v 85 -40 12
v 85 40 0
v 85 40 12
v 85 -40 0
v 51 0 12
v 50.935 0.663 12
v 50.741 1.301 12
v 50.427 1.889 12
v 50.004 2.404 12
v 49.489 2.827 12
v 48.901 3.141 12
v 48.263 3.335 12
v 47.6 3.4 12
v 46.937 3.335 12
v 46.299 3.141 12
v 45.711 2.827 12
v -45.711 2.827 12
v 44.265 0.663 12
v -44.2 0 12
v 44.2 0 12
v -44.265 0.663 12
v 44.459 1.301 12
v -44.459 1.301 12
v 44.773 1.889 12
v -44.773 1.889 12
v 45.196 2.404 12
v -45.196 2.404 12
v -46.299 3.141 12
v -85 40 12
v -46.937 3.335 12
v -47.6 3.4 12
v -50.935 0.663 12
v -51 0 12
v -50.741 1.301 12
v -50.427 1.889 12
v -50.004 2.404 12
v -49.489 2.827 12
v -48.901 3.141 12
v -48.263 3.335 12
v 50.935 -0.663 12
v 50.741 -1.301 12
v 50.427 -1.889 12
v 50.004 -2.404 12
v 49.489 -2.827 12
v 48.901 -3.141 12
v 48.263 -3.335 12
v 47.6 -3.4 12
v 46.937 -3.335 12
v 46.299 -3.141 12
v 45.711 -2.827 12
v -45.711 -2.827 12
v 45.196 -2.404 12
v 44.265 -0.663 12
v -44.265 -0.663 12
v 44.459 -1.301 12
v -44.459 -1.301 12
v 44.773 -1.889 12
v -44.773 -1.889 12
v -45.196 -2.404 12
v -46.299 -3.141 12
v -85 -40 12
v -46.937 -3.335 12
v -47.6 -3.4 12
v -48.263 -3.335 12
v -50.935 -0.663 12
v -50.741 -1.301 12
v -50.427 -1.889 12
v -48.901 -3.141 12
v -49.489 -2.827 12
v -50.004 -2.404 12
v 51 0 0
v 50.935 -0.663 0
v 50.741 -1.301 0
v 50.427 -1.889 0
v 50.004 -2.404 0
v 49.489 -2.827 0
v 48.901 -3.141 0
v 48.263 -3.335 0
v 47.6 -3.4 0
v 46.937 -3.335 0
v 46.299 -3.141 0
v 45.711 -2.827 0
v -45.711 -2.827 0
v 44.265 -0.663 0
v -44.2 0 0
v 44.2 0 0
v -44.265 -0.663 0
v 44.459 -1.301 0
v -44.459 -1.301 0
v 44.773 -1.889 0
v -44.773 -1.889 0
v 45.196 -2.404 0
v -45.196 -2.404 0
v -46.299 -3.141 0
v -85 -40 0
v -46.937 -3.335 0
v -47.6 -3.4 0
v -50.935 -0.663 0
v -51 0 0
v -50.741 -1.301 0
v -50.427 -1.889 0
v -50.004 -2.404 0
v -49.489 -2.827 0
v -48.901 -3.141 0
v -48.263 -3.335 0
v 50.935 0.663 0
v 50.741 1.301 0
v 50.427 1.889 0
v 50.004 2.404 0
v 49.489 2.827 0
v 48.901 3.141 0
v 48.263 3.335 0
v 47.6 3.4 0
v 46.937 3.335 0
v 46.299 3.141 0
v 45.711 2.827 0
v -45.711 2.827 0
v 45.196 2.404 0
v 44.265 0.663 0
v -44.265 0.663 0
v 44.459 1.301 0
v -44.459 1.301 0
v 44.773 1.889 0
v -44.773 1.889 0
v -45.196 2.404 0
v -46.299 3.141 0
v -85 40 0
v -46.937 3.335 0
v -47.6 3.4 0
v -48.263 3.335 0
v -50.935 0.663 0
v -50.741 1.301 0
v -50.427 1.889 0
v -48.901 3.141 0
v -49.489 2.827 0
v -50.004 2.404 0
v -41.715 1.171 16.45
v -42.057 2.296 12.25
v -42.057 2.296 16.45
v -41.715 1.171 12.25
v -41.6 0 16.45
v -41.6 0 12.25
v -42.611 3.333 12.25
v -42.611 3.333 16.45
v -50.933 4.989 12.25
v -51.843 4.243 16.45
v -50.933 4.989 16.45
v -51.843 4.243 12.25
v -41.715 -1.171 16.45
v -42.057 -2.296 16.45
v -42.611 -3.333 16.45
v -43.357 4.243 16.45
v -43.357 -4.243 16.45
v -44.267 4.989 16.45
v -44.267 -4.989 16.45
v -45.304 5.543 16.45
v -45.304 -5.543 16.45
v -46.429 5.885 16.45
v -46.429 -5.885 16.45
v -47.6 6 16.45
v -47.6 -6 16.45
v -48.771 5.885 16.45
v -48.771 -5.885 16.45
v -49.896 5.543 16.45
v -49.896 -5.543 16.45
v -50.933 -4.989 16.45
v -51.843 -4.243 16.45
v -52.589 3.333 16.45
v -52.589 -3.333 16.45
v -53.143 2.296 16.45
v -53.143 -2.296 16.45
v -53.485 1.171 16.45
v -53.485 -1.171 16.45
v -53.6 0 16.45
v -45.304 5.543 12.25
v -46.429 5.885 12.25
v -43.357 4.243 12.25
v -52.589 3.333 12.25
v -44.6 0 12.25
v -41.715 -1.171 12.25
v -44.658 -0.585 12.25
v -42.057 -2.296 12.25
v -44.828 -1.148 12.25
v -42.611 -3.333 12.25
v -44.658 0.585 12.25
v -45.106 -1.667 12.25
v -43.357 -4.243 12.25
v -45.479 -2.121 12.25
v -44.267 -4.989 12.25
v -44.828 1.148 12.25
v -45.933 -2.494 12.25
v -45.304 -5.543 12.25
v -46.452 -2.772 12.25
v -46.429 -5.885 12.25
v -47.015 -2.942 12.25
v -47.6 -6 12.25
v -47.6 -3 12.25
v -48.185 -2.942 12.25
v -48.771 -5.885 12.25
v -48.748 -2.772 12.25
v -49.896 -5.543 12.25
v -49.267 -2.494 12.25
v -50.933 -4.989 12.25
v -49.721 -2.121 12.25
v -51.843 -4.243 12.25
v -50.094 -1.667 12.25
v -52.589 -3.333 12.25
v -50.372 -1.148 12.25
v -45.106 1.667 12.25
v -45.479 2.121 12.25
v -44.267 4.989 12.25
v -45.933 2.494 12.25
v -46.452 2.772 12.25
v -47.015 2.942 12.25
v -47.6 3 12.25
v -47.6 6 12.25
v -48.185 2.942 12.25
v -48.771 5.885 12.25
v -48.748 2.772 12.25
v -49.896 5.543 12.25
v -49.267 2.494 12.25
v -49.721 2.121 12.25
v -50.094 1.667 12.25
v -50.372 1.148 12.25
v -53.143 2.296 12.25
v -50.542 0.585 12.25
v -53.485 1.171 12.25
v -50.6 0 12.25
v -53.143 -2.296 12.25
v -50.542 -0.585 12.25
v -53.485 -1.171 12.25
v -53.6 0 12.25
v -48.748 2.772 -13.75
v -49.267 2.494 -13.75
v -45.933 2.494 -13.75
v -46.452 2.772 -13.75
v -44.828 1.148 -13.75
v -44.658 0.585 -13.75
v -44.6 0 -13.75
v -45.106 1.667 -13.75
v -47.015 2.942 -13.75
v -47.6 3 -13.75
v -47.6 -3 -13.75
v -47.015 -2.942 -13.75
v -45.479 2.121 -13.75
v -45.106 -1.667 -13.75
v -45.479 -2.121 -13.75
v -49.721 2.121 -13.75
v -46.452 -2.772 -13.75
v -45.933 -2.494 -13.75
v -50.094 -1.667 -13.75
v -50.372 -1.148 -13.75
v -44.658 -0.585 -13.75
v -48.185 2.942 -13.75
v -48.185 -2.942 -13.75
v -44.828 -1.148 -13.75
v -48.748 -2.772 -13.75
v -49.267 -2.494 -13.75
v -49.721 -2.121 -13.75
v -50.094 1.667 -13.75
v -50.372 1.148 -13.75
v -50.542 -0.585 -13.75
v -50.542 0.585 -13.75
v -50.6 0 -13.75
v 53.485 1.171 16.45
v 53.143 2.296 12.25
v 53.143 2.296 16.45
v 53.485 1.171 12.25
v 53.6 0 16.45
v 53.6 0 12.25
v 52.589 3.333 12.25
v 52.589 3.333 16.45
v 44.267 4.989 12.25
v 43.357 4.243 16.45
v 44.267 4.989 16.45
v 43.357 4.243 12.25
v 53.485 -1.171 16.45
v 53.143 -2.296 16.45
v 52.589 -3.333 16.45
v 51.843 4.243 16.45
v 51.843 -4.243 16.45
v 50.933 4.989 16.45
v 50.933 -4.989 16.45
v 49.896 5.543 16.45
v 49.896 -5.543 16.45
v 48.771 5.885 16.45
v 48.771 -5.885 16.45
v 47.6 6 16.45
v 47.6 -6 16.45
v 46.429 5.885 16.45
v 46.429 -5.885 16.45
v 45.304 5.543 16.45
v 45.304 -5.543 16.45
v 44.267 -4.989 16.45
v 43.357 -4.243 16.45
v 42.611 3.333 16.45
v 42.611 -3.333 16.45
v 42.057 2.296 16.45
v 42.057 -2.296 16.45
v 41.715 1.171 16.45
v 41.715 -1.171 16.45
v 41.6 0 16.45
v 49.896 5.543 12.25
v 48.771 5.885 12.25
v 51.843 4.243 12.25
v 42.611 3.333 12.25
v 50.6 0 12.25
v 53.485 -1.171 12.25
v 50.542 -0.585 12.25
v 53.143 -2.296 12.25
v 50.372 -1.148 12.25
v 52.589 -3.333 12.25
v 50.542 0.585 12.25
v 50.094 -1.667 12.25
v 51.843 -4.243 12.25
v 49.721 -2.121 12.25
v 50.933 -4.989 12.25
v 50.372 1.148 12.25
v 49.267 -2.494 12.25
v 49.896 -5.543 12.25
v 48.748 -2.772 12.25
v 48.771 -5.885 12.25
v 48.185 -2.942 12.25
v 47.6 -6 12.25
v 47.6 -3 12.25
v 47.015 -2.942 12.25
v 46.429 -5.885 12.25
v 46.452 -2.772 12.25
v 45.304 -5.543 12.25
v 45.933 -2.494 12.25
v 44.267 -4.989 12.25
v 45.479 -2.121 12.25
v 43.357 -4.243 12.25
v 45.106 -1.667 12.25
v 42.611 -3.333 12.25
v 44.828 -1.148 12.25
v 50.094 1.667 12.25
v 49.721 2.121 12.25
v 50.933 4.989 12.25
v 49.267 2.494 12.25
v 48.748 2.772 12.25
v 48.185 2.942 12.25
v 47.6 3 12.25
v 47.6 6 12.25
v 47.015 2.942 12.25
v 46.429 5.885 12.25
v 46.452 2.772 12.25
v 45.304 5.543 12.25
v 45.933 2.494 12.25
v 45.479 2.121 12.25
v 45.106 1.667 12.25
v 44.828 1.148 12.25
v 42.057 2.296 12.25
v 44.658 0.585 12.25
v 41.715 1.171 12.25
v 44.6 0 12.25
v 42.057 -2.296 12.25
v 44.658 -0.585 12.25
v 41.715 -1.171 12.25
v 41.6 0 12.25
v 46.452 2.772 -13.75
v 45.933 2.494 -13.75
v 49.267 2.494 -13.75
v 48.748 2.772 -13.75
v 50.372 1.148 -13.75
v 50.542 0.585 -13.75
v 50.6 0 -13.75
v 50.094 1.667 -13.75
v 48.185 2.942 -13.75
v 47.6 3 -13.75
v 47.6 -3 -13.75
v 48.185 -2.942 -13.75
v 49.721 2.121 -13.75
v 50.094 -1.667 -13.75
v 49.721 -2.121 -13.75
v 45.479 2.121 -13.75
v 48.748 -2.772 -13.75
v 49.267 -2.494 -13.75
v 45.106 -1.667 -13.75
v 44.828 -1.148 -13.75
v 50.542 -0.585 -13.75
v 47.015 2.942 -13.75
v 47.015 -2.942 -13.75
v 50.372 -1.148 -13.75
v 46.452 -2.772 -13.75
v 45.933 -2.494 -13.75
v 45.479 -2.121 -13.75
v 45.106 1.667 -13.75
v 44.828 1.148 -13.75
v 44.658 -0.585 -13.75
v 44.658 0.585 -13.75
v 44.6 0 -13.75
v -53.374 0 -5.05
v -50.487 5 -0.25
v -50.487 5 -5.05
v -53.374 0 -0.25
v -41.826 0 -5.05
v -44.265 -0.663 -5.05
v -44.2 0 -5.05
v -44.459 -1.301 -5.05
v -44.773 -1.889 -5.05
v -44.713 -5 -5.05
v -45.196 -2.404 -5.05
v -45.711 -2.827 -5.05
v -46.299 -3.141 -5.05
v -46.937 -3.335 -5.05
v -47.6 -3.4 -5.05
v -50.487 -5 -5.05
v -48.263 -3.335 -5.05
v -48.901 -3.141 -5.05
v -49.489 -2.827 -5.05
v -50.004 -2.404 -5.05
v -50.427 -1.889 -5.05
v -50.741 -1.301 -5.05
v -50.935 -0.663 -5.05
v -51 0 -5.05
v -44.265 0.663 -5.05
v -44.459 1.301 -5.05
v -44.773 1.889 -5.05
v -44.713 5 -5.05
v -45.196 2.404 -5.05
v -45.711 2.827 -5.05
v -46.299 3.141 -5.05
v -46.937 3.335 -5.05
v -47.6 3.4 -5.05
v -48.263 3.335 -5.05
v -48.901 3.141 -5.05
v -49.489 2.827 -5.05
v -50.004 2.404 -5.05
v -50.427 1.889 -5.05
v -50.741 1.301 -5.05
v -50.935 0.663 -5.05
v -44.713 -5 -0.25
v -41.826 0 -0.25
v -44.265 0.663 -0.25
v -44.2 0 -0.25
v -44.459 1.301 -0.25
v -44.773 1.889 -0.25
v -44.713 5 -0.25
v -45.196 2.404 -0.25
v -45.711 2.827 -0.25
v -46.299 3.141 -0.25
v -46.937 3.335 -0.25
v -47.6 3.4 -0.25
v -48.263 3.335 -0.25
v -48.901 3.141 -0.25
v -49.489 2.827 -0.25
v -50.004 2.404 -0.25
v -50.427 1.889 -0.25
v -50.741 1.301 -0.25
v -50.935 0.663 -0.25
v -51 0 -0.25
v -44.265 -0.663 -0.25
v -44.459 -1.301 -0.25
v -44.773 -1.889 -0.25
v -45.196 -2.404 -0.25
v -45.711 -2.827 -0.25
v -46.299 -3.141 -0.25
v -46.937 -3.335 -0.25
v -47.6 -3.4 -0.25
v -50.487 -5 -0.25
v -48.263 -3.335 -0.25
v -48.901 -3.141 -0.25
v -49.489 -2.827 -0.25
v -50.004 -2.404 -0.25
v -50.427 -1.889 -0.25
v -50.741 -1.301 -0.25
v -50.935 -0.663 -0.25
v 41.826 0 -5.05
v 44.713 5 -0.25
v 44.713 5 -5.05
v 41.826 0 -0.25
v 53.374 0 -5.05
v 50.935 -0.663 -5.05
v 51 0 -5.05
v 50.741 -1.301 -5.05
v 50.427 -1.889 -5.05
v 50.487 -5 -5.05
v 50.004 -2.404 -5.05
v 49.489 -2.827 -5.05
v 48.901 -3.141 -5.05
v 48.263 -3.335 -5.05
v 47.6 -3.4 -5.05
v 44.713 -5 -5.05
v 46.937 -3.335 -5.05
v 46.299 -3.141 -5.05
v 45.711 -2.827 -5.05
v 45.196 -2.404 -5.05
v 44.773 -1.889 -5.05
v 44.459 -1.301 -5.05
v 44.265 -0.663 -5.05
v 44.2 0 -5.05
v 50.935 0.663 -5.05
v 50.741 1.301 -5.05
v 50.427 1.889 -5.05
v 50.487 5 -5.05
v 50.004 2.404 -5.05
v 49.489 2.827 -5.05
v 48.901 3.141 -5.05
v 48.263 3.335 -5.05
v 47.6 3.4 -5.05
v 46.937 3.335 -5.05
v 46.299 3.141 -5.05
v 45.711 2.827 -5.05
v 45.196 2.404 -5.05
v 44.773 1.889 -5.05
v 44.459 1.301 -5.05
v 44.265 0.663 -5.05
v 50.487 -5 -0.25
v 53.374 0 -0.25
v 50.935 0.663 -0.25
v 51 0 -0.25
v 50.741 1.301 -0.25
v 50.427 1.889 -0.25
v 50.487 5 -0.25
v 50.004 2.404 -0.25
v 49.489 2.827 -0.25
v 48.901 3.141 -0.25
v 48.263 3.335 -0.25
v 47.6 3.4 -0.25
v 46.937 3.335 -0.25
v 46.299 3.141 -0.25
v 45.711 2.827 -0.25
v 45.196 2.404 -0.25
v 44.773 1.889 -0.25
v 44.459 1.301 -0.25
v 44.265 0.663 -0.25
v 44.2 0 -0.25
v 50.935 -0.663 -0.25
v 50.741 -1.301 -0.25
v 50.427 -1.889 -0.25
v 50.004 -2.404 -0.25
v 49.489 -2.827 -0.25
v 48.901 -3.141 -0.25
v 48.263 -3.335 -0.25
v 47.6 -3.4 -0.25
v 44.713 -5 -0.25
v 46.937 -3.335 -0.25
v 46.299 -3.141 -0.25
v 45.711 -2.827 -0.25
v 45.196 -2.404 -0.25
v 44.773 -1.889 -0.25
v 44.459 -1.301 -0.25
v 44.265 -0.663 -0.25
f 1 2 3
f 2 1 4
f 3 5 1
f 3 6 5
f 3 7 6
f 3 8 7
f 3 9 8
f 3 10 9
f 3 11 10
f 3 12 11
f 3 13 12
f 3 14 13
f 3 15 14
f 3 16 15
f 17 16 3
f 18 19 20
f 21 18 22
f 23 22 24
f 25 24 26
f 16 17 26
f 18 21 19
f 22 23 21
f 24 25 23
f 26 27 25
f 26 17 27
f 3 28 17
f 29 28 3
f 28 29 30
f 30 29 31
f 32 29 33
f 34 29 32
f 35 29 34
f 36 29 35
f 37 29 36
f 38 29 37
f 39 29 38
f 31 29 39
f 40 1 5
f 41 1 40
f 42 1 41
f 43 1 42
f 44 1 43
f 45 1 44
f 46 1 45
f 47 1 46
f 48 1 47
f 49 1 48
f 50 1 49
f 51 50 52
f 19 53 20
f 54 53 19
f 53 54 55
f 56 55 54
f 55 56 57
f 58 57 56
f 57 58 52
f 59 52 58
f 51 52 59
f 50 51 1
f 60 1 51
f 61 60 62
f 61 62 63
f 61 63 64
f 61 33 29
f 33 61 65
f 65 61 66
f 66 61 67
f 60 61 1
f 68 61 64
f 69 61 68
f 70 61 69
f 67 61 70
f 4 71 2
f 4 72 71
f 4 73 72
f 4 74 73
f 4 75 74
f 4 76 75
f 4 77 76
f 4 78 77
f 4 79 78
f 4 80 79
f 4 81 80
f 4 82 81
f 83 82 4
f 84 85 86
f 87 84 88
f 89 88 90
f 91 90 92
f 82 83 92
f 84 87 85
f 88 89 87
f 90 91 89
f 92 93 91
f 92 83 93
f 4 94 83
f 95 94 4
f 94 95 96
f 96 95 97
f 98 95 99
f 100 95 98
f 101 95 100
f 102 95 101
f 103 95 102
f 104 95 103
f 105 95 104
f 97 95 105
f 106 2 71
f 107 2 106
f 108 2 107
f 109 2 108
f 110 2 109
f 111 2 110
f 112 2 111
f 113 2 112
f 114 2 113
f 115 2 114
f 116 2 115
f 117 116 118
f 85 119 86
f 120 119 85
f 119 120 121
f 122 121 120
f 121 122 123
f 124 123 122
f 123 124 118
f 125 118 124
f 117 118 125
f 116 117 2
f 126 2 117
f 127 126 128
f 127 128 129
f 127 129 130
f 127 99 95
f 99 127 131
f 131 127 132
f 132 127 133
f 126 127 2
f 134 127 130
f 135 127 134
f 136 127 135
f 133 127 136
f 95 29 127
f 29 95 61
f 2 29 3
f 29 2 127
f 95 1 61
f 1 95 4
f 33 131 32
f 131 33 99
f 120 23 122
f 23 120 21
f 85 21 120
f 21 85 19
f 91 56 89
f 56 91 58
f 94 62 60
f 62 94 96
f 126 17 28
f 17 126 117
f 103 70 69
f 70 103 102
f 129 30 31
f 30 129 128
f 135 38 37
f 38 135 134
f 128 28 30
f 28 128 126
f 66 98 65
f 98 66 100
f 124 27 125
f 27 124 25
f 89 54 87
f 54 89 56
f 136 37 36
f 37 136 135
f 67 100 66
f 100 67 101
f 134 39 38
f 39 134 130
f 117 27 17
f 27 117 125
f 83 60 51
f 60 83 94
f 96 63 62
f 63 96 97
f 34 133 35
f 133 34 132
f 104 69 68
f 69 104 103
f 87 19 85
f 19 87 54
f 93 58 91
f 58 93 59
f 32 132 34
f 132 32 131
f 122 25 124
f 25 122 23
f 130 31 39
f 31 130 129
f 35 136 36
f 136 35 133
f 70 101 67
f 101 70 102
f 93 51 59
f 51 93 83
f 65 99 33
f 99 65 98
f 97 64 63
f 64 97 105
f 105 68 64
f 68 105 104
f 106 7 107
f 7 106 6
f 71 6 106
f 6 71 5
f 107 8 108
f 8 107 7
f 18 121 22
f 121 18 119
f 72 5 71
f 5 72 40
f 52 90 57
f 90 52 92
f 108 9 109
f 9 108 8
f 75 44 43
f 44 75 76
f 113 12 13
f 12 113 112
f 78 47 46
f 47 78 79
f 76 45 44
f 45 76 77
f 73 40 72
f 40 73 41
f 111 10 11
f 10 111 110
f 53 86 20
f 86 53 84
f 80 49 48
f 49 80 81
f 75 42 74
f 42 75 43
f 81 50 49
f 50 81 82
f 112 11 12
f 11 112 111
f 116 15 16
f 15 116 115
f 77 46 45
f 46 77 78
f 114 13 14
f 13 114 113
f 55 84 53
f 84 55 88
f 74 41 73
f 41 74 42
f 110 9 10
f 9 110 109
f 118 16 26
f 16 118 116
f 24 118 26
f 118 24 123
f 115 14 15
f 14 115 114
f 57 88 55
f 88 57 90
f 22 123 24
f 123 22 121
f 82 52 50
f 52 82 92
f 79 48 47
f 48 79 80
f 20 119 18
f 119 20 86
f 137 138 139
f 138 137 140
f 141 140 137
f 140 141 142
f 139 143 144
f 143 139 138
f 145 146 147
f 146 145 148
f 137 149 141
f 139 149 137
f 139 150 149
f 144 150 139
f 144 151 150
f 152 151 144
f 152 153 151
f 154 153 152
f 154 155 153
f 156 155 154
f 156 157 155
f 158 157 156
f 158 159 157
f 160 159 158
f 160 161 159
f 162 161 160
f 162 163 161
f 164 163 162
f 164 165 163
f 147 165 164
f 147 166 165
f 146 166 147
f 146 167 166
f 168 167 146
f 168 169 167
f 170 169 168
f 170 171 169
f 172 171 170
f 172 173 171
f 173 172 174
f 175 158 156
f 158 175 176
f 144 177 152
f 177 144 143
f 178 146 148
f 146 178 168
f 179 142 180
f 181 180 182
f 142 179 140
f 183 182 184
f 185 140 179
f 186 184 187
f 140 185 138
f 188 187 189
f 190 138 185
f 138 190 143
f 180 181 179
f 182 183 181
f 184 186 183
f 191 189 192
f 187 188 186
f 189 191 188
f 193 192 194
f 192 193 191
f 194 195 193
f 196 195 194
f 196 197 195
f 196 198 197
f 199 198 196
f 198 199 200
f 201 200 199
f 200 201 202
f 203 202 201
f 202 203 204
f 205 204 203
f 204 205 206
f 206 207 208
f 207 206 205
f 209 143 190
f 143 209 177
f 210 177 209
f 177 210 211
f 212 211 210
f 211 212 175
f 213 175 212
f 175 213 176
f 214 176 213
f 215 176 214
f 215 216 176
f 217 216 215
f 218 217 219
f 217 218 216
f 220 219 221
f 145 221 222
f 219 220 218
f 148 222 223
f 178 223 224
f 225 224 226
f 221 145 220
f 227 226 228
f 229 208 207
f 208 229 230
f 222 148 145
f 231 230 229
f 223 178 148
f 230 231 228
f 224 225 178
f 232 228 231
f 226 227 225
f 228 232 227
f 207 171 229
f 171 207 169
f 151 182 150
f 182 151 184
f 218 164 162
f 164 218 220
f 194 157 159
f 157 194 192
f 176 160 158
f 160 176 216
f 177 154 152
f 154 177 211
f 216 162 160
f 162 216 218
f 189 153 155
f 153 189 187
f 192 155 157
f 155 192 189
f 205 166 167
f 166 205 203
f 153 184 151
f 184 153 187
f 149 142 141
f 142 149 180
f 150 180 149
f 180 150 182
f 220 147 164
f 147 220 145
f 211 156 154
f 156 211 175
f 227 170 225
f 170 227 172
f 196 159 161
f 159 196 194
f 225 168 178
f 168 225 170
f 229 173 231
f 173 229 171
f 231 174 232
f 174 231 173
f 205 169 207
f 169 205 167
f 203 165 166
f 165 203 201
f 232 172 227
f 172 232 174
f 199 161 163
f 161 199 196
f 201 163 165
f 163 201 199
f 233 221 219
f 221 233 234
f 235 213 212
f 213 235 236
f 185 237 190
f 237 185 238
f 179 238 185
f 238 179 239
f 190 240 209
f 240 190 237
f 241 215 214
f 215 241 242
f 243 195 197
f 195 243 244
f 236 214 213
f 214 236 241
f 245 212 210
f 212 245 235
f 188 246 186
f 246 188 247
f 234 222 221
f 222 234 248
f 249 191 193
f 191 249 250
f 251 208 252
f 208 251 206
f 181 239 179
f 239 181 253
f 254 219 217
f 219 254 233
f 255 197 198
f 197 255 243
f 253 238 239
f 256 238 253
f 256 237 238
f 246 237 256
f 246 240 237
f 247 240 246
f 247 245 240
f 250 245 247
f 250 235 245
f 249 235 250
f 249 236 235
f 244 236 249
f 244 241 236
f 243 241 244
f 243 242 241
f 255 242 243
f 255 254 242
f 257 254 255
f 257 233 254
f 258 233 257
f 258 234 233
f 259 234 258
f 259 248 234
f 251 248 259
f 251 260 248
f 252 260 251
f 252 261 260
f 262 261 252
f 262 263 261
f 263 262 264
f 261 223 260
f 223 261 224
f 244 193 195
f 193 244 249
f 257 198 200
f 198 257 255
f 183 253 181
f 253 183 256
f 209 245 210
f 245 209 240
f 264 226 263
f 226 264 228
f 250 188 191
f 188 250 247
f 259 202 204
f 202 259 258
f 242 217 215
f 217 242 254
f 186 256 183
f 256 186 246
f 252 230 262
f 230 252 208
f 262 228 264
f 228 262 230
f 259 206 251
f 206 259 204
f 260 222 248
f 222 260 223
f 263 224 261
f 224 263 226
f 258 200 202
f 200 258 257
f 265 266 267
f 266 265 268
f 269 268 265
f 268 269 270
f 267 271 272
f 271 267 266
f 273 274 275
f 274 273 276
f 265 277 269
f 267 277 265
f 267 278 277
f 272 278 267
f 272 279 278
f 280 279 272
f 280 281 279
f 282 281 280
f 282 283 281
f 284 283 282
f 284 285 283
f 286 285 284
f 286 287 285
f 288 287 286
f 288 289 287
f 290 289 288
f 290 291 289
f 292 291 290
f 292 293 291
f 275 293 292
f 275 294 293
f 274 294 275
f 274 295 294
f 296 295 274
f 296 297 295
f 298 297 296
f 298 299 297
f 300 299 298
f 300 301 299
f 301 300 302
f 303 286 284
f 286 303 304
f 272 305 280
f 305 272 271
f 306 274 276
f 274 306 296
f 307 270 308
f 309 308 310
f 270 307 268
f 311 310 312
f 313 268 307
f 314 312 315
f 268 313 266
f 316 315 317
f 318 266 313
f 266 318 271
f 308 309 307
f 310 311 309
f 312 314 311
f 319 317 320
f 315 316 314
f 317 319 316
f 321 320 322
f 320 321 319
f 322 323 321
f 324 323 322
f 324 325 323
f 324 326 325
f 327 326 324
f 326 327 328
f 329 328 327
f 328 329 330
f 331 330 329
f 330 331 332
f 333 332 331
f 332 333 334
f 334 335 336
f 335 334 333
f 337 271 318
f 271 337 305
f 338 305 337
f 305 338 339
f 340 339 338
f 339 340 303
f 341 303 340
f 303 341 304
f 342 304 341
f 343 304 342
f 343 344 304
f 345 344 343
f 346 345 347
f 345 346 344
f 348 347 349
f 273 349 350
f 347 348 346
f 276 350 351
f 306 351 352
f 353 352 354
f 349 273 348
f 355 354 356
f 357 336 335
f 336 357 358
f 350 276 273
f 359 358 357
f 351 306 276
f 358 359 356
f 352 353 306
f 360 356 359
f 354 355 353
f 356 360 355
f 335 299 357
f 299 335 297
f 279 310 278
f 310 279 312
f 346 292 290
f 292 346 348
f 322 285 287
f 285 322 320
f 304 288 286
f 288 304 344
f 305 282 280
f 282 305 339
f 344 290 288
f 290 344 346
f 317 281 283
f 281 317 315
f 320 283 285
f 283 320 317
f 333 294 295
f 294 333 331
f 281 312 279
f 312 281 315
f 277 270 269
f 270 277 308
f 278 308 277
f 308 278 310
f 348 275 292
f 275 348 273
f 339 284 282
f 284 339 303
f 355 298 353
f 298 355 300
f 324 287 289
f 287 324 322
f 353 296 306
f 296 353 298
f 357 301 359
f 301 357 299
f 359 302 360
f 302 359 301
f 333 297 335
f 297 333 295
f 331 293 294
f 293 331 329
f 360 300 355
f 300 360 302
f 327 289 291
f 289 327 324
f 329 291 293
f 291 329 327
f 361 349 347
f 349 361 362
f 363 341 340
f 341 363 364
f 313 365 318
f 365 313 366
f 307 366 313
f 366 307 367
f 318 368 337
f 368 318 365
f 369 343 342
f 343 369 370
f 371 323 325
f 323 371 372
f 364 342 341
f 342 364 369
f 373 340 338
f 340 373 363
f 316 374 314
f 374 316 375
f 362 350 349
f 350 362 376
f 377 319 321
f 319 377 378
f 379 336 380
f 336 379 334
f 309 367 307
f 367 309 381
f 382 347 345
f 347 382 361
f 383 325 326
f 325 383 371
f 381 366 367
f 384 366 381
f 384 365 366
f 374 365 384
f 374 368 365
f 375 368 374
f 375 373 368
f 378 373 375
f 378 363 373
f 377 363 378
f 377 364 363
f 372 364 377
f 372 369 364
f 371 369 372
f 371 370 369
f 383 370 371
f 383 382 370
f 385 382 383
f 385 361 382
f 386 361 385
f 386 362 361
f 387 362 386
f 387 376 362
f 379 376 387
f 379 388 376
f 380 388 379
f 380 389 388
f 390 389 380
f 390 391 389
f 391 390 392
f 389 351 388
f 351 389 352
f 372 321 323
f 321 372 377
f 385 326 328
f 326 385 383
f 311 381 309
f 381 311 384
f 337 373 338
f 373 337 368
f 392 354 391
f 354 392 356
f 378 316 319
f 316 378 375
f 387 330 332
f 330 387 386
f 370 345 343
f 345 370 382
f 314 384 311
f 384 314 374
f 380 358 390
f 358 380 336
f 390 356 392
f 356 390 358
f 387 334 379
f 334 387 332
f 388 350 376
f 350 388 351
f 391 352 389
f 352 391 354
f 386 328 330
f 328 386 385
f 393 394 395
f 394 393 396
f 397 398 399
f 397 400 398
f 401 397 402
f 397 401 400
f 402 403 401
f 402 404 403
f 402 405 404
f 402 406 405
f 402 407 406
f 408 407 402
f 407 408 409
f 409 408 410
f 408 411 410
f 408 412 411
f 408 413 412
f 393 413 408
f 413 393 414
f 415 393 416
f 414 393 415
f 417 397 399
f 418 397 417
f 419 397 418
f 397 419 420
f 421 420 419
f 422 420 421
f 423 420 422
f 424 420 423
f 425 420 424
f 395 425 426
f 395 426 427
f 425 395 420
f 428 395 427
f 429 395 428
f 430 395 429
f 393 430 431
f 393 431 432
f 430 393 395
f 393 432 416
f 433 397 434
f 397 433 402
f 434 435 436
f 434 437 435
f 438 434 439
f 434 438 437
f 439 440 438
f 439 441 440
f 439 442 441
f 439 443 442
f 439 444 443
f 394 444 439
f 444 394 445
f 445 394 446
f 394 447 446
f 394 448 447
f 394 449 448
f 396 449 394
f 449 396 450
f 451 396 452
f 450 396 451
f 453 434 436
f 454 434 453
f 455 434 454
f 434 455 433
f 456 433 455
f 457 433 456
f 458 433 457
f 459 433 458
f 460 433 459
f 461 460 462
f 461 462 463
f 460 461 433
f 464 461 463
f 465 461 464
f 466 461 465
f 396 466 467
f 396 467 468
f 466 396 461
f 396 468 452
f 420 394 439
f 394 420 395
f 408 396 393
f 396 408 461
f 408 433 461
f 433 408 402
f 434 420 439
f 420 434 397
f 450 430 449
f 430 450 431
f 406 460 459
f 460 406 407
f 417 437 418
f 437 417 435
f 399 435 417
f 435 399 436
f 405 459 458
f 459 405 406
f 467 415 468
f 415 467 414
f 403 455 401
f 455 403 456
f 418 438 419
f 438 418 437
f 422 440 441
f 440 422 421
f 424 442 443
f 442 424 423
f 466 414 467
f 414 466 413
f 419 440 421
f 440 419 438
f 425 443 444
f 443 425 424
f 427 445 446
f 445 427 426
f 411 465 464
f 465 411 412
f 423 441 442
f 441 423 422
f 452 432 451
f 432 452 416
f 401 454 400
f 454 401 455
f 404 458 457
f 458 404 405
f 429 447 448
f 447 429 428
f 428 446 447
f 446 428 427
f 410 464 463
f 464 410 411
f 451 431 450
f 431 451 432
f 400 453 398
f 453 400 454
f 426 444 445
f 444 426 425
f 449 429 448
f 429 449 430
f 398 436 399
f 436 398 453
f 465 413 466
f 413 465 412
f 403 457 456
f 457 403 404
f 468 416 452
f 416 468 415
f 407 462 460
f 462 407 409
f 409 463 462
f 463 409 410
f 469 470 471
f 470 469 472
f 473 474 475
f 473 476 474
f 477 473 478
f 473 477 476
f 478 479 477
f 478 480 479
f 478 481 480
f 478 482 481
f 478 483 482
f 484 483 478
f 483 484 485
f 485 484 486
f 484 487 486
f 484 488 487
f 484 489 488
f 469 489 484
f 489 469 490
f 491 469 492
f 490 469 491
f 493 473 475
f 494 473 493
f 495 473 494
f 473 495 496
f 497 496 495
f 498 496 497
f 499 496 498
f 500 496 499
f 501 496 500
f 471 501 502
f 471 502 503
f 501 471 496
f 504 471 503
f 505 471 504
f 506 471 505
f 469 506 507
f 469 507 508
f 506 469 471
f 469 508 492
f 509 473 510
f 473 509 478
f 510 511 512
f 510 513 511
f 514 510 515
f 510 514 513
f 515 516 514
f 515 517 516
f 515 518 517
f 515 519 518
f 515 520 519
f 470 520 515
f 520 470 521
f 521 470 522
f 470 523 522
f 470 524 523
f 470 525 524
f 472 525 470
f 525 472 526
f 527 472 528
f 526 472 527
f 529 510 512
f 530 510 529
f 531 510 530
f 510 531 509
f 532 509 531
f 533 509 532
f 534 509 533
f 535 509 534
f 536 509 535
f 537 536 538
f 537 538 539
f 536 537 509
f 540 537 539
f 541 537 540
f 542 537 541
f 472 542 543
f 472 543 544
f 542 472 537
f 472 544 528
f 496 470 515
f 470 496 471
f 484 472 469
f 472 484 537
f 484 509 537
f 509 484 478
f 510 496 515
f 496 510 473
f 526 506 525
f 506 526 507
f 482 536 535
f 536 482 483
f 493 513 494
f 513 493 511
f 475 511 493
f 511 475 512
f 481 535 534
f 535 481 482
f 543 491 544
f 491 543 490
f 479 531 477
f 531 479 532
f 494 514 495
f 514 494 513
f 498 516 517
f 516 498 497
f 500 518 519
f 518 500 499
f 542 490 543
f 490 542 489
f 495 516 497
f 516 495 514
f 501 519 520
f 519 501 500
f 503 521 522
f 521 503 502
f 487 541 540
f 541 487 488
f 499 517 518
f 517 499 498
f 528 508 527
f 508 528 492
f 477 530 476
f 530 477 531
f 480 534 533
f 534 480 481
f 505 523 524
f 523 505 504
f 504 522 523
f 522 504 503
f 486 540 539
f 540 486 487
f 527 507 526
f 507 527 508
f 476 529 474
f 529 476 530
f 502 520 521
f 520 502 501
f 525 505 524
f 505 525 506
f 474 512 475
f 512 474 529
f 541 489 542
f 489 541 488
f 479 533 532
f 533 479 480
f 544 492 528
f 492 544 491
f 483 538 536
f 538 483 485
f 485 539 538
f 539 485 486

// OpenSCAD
$fn = 32;

// ------------------------------------------------------------------------
// Bolted plate: 170 x 80 x 12 mm plate, 2 fasteners
// Every part is its own module, assembly() places them once.
// ------------------------------------------------------------------------

// --- part 1 ---
module plate() {
  difference() {
    translate([-85, -40, 0]) cube([170, 80, 12]);
    translate([-47.6, 0, -1]) cylinder(h = 14, d = 6.8);
    translate([47.6, 0, -1]) cylinder(h = 14, d = 6.8);
  }
}

// --- part 2 ---
module bolt1() {
  cylinder(h = 4.2, d = 12);
  translate([0, 0, -26]) cylinder(h = 26, d = 6);
}

// --- part 3 ---
module bolt2() {
  cylinder(h = 4.2, d = 12);
  translate([0, 0, -26]) cylinder(h = 26, d = 6);
}

// --- part 4 ---
module nut1() {
  difference() {
    linear_extrude(height = 4.8) polygon(points = [[5.774, 0], [2.887, 5], [-2.887, 5], [-5.774, 0], [-2.887, -5], [2.887, -5]]);
    translate([0, 0, -1]) cylinder(h = 6.8, d = 6.8);
  }
}

// --- part 5 ---
module nut2() {
  difference() {
    linear_extrude(height = 4.8) polygon(points = [[5.774, 0], [2.887, 5], [-2.887, 5], [-5.774, 0], [-2.887, -5], [2.887, -5]]);
    translate([0, 0, -1]) cylinder(h = 6.8, d = 6.8);
  }
}

// --- assembly ---
module assembly() {
  translate([0, 0, 0]) rotate([0, 0, 0]) plate();
  translate([-47.6, 0, 12.25]) rotate([0, 0, 0]) bolt1();
  translate([47.6, 0, 12.25]) rotate([0, 0, 0]) bolt2();
  translate([-47.6, 0, -5.05]) rotate([0, 0, 0]) nut1();
  translate([47.6, 0, -5.05]) rotate([0, 0, 0]) nut2();
}

assembly();
